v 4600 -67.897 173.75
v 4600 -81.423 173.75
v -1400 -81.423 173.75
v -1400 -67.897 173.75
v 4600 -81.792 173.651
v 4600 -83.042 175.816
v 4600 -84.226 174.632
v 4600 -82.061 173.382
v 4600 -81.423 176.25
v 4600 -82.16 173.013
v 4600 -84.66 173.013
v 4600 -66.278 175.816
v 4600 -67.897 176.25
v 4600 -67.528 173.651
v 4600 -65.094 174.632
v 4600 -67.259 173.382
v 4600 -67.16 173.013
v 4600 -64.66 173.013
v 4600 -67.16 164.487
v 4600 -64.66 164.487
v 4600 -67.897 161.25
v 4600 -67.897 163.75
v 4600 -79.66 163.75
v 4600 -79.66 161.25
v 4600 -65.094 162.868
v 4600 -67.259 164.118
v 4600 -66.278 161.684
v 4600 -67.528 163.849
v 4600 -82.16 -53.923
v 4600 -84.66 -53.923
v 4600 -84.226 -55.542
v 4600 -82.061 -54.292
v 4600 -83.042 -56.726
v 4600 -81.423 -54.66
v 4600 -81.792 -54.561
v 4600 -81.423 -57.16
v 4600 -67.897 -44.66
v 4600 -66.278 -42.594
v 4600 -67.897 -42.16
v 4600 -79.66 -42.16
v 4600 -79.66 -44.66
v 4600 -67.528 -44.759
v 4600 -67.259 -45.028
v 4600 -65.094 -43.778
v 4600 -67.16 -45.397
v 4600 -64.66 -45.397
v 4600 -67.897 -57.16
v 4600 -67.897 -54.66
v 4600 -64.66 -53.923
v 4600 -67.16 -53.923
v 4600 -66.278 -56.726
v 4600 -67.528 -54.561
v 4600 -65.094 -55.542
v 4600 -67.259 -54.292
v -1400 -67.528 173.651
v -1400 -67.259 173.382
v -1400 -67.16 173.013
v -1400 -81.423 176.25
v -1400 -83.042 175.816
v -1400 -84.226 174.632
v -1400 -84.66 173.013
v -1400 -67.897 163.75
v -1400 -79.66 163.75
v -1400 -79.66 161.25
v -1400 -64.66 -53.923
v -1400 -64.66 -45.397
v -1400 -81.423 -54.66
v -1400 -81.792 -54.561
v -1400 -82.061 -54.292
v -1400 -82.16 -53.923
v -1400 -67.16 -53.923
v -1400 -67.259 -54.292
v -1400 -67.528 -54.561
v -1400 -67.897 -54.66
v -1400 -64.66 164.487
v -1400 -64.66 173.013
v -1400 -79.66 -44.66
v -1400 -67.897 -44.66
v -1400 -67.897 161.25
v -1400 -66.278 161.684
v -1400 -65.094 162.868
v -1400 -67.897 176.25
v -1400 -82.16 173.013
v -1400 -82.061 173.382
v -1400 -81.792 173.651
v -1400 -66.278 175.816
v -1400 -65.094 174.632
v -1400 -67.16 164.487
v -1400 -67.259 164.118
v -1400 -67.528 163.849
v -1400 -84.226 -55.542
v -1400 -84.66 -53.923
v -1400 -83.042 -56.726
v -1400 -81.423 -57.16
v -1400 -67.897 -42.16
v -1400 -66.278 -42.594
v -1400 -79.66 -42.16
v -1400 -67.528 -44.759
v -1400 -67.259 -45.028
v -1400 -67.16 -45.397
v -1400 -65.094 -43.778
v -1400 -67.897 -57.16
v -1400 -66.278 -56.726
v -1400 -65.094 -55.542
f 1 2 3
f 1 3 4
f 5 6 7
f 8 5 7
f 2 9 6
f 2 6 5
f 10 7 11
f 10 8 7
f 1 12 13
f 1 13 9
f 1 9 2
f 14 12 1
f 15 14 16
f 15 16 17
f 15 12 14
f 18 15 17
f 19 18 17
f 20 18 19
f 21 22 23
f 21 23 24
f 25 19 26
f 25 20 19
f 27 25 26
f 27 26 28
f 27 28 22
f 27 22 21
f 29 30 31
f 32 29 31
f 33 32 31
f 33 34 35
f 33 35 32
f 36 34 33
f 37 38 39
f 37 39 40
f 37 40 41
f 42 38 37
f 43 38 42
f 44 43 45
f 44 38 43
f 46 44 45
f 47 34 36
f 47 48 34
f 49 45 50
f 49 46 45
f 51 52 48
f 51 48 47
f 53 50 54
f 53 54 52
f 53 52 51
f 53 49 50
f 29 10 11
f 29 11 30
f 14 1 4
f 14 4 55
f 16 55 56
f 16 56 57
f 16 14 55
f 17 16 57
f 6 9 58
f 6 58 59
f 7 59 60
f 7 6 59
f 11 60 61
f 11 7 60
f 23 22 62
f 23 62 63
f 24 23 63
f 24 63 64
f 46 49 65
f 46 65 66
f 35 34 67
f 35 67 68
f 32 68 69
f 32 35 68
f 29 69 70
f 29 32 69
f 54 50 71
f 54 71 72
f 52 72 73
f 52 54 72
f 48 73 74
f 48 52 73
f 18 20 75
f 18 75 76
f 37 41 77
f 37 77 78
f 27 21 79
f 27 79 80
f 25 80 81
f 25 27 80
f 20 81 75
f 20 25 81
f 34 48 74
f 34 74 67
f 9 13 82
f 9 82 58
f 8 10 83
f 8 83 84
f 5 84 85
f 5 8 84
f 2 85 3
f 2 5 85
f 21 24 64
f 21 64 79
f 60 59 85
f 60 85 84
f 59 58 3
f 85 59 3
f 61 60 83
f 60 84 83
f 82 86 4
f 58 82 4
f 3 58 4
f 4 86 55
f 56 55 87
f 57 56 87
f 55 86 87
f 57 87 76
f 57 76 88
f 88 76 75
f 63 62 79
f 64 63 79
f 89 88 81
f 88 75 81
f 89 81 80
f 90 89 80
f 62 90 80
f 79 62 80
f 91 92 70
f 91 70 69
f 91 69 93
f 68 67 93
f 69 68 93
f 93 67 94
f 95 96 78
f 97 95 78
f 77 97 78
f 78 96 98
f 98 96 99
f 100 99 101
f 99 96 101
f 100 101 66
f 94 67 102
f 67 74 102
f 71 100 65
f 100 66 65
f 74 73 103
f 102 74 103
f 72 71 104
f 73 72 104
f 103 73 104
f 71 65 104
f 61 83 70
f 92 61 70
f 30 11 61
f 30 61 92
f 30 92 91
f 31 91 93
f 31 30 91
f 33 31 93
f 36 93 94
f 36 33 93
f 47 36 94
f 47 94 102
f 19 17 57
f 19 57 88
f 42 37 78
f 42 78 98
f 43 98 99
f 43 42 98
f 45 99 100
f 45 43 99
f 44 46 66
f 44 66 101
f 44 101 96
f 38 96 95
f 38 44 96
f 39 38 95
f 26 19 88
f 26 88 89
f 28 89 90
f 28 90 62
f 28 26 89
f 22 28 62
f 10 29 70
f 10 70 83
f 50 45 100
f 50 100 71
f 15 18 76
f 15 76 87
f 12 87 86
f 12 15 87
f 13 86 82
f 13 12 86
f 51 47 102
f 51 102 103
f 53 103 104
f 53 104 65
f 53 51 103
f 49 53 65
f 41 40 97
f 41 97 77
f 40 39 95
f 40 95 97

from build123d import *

# Parameters (mm, degrees)
BASE_FLANGE1_DEPTH = 6000


# Sheet-metal steps are written as plain solids
with BuildPart() as part:
    # Sketch2 → Base-Flange1 (new body)
    with BuildSketch(Plane(origin=(4600, 0, 0), x_dir=(0, 0, -1), z_dir=(1, 0, 0))):
        with BuildLine():
            Line((-161.25, -79.66), (-161.25, -67.8966))
            ThreePointArc((-161.25, -67.8966), (-162.197978192, -65.607978192), (-164.4866, -64.66))
            Line((-164.4866, -64.66), (-173.0134, -64.66))
            ThreePointArc((-173.0134, -64.66), (-175.302021808, -65.607978192), (-176.25, -67.8966))
            Line((-176.25, -67.8966), (-176.25, -81.4234))
            ThreePointArc((-176.25, -81.4234), (-175.302021808, -83.712021808), (-173.0134, -84.66))
            Line((-173.0134, -84.66), (53.9234, -84.66))
            ThreePointArc((53.9234, -84.66), (56.212021808, -83.712021808), (57.16, -81.4234))
            Line((57.16, -81.4234), (57.16, -67.8966))
            ThreePointArc((57.16, -67.8966), (56.212021808, -65.607978192), (53.9234, -64.66))
            Line((53.9234, -64.66), (45.3966, -64.66))
            ThreePointArc((45.3966, -64.66), (43.107978192, -65.607978192), (42.16, -67.8966))
            Line((42.16, -67.8966), (42.16, -79.66))
            Line((42.16, -79.66), (44.66, -79.66))
            Line((44.66, -79.66), (44.66, -67.8966))
            ThreePointArc((44.66, -67.8966), (44.875745145, -67.375745145), (45.3966, -67.16))
            Line((45.3966, -67.16), (53.9234, -67.16))
            ThreePointArc((53.9234, -67.16), (54.444254855, -67.375745145), (54.66, -67.8966))
            Line((54.66, -67.8966), (54.66, -81.4234))
            ThreePointArc((54.66, -81.4234), (54.444254855, -81.944254855), (53.9234, -82.16))
            Line((53.9234, -82.16), (-173.0134, -82.16))
            ThreePointArc((-173.0134, -82.16), (-173.534254855, -81.944254855), (-173.75, -81.4234))
            Line((-173.75, -81.4234), (-173.75, -67.8966))
            ThreePointArc((-173.75, -67.8966), (-173.534254855, -67.375745145), (-173.0134, -67.16))
            Line((-173.0134, -67.16), (-164.4866, -67.16))
            ThreePointArc((-164.4866, -67.16), (-163.965745145, -67.375745145), (-163.75, -67.8966))
            Line((-163.75, -67.8966), (-163.75, -79.66))
            Line((-163.75, -79.66), (-161.25, -79.66))
        make_face()
    extrude(amount=-BASE_FLANGE1_DEPTH)


solid = part.part
